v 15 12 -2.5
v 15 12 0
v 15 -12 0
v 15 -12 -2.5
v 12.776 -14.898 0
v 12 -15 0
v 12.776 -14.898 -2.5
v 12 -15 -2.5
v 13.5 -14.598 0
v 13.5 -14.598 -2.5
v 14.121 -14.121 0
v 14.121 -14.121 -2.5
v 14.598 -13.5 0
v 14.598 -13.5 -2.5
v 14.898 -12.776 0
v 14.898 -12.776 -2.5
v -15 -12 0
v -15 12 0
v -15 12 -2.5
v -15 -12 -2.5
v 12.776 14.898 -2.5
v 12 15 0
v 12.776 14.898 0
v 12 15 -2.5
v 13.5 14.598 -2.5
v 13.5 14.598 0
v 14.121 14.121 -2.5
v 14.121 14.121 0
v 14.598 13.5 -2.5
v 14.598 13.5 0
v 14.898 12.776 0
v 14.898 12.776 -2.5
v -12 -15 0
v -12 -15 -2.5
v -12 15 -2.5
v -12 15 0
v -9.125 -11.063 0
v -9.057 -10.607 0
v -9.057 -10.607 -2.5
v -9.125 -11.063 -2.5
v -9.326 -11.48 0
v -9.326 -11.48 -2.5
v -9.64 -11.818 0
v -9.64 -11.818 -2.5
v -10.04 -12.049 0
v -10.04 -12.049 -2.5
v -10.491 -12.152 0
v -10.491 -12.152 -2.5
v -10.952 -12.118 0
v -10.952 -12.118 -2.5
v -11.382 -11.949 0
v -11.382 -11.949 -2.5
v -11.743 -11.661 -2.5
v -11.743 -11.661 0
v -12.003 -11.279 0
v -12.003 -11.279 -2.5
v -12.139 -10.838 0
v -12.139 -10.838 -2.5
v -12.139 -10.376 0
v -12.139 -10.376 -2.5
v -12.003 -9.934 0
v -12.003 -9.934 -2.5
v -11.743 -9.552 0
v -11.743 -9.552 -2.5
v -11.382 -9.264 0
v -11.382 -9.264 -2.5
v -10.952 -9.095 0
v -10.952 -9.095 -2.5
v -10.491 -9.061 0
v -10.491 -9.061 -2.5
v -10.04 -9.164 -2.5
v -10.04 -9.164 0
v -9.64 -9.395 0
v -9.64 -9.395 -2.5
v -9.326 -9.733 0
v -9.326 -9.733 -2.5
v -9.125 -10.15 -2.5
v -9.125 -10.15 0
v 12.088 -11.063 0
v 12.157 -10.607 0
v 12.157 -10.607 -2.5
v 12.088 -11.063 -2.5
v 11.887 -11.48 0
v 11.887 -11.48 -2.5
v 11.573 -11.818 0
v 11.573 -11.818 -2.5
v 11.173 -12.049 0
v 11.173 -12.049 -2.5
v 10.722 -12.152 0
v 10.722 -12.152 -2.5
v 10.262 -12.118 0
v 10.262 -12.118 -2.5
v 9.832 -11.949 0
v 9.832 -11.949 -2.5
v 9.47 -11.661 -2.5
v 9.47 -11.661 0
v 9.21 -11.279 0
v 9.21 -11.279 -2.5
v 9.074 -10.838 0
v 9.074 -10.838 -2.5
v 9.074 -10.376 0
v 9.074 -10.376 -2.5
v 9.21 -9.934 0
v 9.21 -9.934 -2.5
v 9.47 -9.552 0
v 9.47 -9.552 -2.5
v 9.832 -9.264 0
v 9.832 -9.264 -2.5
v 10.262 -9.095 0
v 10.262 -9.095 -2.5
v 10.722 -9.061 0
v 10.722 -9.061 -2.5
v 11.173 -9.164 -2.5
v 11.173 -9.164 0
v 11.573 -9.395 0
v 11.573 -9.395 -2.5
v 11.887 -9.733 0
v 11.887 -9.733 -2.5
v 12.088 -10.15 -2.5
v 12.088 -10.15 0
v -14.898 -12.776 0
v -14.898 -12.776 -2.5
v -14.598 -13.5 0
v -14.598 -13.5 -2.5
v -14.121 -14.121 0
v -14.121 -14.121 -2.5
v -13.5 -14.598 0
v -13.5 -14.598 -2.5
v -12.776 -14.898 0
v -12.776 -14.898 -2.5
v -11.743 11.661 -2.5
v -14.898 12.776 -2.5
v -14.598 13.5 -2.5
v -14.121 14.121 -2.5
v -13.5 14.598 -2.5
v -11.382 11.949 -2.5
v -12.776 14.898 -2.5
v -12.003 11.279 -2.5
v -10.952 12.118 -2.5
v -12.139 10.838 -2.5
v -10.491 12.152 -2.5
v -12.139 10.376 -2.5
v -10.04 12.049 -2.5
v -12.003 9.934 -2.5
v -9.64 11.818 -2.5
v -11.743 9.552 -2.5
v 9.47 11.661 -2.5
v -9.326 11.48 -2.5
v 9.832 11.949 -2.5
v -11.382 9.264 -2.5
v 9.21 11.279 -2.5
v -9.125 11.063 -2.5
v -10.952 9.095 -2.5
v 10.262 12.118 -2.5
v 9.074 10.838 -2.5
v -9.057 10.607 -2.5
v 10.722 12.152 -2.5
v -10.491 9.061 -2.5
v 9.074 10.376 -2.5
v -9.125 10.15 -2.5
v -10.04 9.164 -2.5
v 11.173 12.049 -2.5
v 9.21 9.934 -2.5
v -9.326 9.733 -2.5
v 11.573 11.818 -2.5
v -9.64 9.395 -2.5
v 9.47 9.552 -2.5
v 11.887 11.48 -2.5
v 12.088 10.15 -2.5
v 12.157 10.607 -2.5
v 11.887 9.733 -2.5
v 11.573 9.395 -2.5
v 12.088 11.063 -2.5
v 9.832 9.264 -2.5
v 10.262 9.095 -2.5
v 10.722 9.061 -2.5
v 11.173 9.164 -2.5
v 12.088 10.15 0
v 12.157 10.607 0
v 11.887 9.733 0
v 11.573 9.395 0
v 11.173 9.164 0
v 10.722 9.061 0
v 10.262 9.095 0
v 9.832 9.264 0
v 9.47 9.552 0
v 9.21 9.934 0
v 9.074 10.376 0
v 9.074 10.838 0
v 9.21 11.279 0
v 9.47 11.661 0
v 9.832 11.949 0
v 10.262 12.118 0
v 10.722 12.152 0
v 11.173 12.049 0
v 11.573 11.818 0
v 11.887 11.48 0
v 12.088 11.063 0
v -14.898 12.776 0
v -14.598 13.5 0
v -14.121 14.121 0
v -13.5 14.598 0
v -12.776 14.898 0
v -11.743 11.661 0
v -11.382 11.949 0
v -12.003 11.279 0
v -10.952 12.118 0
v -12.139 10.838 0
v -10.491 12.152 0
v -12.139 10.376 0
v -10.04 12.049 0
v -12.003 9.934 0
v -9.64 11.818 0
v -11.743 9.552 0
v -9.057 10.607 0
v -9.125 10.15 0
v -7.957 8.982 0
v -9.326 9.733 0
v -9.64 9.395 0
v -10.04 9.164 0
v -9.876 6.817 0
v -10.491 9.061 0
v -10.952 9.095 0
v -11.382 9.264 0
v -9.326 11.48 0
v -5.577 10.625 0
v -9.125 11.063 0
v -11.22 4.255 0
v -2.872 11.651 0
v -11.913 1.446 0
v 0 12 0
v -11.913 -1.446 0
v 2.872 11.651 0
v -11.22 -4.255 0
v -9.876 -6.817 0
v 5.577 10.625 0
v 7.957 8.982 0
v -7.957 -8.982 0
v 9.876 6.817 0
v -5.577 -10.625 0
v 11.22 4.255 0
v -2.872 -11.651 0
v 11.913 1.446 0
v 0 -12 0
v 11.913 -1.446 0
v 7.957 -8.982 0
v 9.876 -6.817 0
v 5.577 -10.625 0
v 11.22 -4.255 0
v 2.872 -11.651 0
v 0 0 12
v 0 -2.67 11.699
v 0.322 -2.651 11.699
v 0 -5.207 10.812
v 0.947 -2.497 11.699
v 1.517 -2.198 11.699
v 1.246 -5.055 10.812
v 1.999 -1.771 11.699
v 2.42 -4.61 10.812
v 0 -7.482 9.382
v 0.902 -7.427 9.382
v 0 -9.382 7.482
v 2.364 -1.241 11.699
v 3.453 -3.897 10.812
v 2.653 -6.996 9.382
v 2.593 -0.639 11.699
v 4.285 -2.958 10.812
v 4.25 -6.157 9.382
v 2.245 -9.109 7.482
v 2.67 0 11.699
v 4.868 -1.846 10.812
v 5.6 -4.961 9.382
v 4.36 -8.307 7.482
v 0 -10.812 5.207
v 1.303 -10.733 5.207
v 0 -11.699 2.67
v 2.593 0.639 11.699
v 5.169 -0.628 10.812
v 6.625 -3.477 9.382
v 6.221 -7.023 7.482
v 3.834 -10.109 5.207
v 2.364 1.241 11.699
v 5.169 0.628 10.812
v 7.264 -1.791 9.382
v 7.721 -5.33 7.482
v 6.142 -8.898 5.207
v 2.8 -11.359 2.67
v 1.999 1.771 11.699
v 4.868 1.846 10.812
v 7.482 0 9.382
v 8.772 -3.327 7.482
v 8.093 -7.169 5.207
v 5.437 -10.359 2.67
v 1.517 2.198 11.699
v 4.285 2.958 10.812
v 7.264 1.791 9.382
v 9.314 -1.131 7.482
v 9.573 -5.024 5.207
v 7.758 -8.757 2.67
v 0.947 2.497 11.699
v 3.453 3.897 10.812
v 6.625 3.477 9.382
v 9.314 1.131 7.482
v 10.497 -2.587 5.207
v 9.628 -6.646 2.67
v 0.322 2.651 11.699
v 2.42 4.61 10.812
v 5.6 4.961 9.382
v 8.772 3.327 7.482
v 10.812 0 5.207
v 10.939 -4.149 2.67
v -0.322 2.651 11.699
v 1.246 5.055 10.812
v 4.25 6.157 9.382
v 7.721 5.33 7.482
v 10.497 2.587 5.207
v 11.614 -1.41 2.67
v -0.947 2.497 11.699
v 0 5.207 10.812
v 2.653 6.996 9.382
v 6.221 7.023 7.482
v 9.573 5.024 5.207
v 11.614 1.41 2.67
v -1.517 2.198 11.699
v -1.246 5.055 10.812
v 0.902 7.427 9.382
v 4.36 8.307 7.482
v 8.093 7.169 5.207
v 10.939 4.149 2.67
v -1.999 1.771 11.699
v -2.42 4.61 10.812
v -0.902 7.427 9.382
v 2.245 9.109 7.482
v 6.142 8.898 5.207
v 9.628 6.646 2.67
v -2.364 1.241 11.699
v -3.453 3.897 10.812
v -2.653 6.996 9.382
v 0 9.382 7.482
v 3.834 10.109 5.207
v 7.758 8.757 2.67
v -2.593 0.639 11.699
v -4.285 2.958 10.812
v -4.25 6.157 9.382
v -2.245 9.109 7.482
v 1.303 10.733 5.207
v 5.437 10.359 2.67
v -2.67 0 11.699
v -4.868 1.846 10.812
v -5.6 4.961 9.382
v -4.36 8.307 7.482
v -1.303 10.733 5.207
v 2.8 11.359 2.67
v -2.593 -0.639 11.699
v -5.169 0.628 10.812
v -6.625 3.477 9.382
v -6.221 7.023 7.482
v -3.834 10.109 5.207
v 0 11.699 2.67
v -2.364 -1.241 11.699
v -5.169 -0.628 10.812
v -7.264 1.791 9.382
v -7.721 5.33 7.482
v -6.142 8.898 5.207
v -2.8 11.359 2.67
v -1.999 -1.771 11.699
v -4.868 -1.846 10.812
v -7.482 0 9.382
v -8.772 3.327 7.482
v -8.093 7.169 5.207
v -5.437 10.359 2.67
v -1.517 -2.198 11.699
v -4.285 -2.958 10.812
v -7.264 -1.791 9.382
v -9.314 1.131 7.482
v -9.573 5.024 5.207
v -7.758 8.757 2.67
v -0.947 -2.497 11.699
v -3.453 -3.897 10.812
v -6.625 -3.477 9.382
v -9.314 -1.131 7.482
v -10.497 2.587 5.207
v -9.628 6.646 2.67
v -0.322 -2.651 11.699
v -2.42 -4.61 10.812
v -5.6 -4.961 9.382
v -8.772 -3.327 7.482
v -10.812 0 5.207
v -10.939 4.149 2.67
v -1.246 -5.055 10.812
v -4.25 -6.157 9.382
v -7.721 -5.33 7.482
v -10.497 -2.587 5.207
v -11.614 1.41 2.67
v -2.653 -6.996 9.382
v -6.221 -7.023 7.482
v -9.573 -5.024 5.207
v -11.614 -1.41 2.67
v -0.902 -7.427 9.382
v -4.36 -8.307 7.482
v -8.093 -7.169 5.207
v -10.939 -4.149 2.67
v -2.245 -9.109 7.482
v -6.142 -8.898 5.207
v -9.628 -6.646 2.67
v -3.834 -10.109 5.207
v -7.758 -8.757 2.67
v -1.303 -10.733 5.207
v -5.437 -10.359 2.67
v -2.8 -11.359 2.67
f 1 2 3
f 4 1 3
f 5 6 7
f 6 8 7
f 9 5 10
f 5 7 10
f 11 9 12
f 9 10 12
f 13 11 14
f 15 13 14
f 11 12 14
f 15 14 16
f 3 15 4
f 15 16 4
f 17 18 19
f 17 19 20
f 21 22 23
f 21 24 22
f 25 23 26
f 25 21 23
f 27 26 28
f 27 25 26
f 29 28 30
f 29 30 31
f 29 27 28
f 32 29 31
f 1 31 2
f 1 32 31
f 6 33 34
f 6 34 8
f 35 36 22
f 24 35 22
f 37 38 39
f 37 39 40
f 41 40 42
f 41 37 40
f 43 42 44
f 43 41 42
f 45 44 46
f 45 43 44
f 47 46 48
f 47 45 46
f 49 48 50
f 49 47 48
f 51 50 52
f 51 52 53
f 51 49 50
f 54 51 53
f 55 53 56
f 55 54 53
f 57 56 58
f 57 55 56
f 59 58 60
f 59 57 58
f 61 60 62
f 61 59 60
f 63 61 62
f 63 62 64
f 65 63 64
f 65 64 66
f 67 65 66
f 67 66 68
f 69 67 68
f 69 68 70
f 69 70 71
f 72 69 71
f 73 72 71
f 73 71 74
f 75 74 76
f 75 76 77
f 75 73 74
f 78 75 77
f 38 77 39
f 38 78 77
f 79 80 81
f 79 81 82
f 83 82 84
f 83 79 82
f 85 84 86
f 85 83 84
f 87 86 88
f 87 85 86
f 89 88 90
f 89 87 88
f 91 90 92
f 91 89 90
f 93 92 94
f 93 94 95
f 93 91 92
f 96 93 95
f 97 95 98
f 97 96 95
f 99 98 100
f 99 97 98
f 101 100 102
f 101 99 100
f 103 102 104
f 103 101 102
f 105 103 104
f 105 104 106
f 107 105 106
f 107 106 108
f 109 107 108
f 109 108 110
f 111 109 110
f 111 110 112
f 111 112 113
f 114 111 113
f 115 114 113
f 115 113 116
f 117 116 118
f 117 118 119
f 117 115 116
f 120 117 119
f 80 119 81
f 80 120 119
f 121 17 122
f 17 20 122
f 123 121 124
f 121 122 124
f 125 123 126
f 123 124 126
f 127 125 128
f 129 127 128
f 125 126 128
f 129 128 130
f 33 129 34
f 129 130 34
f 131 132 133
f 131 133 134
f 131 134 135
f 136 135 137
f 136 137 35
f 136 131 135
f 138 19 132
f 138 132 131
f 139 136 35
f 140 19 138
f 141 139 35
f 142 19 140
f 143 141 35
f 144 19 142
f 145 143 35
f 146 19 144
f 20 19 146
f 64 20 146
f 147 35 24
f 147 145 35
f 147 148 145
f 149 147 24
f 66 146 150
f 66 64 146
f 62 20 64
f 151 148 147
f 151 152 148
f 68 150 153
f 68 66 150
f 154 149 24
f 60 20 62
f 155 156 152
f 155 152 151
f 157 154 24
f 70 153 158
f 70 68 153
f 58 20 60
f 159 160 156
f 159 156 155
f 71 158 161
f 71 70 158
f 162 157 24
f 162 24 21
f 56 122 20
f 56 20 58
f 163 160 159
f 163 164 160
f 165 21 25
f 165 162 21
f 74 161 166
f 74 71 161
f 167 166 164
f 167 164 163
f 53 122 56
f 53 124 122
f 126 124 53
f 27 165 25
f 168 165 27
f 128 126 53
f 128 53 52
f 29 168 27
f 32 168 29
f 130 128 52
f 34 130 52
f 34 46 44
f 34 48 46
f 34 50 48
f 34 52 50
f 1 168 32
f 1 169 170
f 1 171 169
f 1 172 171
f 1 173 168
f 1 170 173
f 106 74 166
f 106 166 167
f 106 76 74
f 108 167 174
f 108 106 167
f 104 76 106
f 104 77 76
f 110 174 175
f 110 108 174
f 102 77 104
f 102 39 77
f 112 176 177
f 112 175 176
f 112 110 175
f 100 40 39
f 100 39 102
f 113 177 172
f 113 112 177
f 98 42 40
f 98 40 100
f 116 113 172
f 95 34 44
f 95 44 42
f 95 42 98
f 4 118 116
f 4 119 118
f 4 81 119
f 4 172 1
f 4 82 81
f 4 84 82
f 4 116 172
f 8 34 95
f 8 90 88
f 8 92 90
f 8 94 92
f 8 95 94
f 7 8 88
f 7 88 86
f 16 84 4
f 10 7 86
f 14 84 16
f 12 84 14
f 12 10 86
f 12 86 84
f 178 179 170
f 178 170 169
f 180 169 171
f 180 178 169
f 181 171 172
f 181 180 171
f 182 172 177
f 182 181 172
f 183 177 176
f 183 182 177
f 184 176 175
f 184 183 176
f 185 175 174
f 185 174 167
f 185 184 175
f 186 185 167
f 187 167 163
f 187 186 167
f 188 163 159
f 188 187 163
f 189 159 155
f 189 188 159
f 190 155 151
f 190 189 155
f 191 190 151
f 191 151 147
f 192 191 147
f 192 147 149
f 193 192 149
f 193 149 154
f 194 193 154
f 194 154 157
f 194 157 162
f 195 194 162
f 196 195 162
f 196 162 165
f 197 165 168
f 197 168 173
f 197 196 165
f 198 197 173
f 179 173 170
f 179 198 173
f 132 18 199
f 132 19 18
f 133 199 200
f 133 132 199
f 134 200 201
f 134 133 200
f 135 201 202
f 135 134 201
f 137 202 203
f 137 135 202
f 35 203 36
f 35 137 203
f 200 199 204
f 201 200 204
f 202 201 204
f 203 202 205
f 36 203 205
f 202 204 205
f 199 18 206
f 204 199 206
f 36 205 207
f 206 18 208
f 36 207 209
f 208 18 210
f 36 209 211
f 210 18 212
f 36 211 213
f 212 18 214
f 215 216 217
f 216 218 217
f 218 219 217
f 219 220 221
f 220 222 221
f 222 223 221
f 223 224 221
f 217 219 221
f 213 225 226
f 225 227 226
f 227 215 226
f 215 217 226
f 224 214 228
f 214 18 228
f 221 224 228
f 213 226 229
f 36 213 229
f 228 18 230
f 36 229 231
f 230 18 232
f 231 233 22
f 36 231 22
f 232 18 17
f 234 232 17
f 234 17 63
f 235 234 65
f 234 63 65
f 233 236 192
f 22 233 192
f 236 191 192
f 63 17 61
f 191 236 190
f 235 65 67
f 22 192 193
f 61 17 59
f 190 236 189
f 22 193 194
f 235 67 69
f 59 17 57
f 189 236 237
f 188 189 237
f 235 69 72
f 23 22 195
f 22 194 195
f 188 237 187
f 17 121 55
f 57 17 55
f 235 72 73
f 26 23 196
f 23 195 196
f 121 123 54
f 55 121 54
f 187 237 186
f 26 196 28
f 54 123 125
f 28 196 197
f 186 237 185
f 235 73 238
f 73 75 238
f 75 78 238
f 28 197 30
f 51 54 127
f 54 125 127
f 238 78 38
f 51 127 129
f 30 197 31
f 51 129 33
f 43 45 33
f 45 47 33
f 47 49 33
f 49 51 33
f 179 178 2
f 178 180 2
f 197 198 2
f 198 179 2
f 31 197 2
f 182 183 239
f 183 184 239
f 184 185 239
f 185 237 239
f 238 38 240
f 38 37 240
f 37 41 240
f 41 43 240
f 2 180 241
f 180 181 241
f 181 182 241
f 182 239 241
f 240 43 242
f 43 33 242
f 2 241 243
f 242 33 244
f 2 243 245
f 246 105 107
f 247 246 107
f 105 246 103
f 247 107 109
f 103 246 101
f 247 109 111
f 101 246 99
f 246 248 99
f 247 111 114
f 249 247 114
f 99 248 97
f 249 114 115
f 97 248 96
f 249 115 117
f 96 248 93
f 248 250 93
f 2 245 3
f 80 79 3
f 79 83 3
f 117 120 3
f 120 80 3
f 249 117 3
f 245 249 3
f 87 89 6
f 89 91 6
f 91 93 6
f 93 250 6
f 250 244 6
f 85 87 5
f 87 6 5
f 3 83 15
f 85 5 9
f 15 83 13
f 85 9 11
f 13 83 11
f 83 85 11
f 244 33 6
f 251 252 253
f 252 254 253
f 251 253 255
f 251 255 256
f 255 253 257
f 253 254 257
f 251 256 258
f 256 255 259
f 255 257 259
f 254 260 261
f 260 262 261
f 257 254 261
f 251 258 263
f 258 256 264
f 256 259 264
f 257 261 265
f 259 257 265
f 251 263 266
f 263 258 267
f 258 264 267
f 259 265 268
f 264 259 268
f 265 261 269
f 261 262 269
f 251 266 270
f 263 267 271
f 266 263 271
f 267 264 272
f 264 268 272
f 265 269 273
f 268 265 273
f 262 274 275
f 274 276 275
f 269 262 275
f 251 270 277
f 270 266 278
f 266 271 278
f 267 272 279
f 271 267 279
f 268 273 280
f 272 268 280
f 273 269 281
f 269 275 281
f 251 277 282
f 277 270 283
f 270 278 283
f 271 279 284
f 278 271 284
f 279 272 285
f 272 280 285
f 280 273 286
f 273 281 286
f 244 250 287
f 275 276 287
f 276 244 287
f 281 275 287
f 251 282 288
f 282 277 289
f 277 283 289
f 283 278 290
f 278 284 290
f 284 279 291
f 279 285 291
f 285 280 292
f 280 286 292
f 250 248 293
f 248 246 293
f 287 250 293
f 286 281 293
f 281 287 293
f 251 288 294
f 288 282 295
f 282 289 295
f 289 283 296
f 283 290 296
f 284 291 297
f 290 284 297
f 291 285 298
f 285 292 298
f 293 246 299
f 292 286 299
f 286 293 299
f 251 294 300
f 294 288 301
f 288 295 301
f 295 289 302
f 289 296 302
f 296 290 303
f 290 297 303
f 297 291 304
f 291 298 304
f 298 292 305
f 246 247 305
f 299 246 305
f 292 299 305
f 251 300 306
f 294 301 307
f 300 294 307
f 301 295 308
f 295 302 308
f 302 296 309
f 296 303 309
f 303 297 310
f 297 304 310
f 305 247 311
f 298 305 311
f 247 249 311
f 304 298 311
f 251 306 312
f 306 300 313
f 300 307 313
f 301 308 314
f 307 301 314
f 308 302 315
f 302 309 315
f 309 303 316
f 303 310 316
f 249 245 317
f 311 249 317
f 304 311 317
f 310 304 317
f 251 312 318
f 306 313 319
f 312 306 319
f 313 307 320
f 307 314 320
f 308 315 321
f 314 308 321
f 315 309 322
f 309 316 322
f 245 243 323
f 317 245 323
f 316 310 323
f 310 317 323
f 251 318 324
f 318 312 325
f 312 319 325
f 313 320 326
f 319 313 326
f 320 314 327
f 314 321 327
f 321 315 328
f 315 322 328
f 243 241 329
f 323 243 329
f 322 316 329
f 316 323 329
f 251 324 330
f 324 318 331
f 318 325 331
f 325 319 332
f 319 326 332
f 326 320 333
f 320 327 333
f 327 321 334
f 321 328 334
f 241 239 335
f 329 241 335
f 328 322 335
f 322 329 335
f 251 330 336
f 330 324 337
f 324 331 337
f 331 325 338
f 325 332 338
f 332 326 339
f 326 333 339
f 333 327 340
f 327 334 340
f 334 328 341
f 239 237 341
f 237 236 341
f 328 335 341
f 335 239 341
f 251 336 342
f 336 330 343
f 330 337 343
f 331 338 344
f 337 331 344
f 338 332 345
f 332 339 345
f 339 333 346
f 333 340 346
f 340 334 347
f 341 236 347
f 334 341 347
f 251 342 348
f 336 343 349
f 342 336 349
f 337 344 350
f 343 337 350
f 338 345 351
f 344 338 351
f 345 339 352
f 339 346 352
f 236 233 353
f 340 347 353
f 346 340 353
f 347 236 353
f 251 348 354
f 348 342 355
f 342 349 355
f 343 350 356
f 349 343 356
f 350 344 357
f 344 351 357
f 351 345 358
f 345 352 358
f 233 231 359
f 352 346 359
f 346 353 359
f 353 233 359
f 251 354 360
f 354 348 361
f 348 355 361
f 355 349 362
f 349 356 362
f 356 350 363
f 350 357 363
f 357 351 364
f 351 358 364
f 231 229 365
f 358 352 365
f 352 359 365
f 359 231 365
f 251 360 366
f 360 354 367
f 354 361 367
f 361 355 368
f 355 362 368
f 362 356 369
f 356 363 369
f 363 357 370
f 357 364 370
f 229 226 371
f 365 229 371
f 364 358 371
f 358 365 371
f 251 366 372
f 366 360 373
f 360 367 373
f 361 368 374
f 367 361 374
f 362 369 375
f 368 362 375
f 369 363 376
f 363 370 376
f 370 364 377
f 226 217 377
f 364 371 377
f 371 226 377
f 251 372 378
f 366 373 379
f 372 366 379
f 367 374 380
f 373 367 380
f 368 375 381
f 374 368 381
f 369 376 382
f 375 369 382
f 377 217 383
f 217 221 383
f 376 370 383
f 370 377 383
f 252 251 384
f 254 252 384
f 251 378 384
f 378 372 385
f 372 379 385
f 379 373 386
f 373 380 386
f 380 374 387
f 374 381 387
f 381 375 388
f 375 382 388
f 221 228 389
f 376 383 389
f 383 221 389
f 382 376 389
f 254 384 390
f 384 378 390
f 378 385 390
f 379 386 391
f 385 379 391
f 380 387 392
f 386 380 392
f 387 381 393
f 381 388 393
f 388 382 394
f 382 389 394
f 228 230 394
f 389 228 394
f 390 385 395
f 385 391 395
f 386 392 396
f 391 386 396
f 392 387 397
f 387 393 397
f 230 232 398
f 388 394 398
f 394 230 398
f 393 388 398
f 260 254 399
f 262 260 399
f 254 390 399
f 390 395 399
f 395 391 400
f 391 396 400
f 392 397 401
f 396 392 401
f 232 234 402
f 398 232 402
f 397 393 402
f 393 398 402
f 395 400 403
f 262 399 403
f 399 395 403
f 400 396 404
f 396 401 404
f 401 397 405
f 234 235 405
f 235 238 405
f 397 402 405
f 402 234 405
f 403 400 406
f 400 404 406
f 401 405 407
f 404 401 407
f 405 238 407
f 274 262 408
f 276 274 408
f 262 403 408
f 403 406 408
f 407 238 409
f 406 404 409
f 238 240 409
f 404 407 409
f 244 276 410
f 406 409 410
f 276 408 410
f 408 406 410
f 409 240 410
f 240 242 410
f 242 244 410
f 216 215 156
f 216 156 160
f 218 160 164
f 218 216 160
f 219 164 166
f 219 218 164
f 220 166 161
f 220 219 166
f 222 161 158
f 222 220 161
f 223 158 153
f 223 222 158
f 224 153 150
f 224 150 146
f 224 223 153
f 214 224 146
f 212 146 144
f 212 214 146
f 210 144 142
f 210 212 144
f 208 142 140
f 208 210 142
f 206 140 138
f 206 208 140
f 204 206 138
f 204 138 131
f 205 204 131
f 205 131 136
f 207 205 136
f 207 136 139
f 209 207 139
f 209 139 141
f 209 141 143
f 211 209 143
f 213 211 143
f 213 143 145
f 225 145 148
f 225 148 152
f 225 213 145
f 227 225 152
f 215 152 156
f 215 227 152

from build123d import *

# Parameters (mm, degrees)
F2_W     = 30
F2_H     = 30
F2_R     = 1.55
F2_R_2   = 12
F3_DEPTH = 2.5
F4_R     = 3


with BuildPart() as f1:
    # F0 (on Right) → F1 (revolve)
    with BuildSketch(Plane.YZ):
        with BuildLine():
            ThreePointArc((0, 12), (-8.4852813742, 8.4852813742), (-12, 0))
            Line((-12, 0), (0, 0))
            Line((0, 0), (0, 12))
        make_face()
    revolve(axis=Axis((0, 0, 6), (0, 0, 1)))

    # F2 (on face) → F3 (join)
    with BuildSketch(Plane(origin=(0, 0, 0), x_dir=(1, 0, 0), z_dir=(0, 0, -1))):
        Rectangle(F2_W, F2_H)
        with Locations((-10.6066017178, -10.6066017178)):
            Circle(F2_R, mode=Mode.SUBTRACT)
        with Locations((10.6066017178, -10.6066017178)):
            Circle(F2_R, mode=Mode.SUBTRACT)
        with Locations((-10.6066017178, 10.6066017178)):
            Circle(F2_R, mode=Mode.SUBTRACT)
        Circle(F2_R_2, mode=Mode.SUBTRACT)
        with Locations((10.6066017178, 10.6066017178)):
            Circle(F2_R, mode=Mode.SUBTRACT)
        Circle(F2_R_2)
    extrude(amount=F3_DEPTH)

    # F4
    f4_edges = [f1.edges().sort_by_distance(p)[0] for p in [
        (15, 15, -1.25),
        (-15, 15, -1.25),
        (15, -15, -1.25),
        (-15, -15, -1.25),
    ]]
    fillet(f4_edges, radius=F4_R)


solid = f1.part
